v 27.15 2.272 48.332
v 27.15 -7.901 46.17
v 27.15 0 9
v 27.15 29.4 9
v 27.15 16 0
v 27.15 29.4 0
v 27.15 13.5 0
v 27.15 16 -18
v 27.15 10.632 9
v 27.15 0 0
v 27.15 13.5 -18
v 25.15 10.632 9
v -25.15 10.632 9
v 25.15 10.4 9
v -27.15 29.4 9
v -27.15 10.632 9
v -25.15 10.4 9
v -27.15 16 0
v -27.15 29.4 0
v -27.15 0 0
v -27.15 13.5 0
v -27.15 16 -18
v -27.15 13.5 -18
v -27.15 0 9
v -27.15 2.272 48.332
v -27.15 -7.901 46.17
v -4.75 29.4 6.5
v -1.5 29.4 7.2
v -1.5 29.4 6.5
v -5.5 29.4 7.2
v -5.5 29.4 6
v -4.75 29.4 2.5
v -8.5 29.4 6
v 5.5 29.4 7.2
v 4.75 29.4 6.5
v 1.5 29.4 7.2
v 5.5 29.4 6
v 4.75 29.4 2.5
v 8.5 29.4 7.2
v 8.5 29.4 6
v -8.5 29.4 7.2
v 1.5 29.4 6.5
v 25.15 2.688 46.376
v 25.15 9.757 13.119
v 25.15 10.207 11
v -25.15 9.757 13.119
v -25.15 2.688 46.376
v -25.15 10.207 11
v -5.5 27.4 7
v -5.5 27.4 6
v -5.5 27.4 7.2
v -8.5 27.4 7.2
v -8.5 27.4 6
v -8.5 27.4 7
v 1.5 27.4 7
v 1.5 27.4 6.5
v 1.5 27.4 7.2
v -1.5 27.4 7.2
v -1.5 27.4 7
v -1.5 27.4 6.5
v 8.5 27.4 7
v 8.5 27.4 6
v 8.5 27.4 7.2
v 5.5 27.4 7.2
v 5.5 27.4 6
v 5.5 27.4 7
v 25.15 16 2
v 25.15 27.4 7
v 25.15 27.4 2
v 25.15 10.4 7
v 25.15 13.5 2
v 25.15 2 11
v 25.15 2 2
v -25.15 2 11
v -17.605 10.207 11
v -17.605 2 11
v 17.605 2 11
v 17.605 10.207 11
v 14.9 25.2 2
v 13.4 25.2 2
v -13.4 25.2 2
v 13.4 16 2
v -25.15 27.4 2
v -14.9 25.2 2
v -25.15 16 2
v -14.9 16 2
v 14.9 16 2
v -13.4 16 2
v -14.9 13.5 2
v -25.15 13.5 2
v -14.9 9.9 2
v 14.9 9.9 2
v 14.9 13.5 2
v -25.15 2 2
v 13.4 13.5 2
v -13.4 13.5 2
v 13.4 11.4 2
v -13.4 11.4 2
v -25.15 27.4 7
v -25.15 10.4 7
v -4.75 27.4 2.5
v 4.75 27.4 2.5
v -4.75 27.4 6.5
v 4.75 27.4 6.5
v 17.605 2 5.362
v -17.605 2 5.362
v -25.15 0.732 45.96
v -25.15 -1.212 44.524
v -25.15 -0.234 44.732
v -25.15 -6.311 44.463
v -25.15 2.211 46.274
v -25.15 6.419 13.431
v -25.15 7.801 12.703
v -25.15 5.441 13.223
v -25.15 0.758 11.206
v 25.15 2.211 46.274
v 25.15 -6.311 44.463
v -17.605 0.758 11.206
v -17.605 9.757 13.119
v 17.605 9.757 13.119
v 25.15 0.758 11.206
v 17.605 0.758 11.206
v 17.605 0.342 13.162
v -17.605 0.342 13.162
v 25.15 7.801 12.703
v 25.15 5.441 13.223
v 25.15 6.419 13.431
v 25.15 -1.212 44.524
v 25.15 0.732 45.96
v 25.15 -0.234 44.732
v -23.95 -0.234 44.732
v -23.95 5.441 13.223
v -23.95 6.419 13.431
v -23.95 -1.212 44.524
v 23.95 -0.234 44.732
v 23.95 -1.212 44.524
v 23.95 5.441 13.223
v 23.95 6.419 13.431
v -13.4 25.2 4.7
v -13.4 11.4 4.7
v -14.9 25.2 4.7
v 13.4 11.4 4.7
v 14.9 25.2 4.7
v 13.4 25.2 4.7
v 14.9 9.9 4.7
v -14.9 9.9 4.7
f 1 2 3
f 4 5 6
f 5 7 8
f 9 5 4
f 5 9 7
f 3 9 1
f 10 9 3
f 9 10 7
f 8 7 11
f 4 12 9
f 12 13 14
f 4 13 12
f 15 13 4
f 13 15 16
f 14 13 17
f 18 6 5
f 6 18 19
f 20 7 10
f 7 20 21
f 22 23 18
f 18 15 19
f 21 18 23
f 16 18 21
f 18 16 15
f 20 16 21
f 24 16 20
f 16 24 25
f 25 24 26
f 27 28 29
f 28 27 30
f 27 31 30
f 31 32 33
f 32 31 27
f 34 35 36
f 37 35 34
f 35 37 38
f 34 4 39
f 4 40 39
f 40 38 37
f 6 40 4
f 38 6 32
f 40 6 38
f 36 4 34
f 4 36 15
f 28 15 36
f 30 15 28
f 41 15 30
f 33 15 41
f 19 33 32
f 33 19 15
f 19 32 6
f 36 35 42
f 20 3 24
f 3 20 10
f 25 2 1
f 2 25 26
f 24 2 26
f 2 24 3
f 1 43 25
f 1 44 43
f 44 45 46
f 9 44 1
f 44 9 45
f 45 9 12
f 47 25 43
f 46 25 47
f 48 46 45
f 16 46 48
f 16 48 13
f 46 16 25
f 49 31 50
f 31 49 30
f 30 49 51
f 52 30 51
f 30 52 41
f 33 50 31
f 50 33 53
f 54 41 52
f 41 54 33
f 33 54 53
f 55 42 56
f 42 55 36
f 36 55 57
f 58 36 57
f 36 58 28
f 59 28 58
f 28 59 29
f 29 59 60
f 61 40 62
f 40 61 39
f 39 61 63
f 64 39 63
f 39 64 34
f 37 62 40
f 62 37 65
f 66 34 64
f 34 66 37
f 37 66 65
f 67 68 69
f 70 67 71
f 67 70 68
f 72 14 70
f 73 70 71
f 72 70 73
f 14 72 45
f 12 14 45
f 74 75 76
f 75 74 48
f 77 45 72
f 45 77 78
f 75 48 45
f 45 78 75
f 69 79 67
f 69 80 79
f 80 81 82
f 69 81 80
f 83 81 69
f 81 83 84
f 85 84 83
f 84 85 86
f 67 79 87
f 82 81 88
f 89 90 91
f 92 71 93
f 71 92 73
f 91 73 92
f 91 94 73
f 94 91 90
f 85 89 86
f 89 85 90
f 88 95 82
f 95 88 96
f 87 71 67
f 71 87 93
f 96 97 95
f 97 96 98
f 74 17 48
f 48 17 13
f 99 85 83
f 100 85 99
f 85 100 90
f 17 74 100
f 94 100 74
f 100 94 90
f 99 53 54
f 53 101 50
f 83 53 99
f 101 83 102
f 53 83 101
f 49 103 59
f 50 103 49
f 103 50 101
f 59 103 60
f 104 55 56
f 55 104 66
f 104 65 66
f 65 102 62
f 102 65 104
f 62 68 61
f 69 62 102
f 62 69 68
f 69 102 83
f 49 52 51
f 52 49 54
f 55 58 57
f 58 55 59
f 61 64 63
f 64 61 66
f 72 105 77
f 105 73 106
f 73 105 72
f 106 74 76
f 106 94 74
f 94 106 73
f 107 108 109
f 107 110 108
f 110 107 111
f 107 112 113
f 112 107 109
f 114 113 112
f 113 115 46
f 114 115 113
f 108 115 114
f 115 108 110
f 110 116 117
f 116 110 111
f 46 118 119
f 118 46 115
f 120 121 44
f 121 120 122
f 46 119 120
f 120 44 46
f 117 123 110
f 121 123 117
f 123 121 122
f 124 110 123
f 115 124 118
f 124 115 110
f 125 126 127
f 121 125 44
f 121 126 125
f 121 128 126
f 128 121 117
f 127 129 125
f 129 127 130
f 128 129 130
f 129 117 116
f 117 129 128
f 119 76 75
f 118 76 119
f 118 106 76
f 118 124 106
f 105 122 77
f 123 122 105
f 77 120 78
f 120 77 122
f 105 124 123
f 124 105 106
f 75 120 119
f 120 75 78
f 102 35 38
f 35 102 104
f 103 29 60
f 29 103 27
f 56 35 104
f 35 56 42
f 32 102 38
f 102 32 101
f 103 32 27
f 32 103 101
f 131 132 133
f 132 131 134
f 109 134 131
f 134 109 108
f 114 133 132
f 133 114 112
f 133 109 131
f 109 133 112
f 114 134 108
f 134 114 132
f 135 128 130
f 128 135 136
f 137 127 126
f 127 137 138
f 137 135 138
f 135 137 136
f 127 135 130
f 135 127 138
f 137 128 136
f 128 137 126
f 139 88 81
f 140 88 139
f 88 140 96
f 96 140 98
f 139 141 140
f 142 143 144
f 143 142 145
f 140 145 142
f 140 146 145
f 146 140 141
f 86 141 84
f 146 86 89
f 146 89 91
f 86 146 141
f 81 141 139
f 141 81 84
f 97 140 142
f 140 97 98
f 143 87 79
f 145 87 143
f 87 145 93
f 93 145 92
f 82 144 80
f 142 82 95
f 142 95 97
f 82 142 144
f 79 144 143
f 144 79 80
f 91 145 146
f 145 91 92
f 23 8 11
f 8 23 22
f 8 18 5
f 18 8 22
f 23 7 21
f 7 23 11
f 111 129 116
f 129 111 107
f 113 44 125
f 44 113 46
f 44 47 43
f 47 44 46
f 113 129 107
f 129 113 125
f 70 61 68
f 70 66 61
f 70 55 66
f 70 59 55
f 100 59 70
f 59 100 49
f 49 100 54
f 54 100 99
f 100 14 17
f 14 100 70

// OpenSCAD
// ld2460_case.scad — HLK-LD2460 monitor-top enclosure (parametric, mm)
// Render: openscad -D part="shell" | "lid" | "all" -o out.stl ld2460_case.scad
// Frame: X=width (centred), Y=depth (front at 0, screen at +Y), Z=up (foot base at 0)

part = "all";          // "shell" | "lid" | "all"
$fn = 48;

/* ----- Measured / to-confirm (defaults are placeholders) ----- */
ld2460_w     = 32;     // PCB short edge
ld2460_h     = 49.5;   // PCB long edge
landscape    = true;   // true: long edge horizontal (X); false: portrait (long edge up, Z)
ld2460_t     = 1.2;    // PCB thickness            [MEASURE]
comp_height  = 5.0;    // front parts incl. perpendicular connectors [CONFIRM]
ch343_l      = 26;     // CH343P long edge (across X)
ch343_w      = 13;     // CH343P short edge (along Y)
ch343_t      = 1.2;    // CH343P thickness         [MEASURE]
usb_w        = 9.5;    // Type-C cutout width      [MEASURE]
usb_h        = 4.0;    // Type-C cutout height     [MEASURE]
screen_edge_t = 12;    // monitor top-edge thickness [MEASURE]

/* ----- Design / fit ----- */
wall         = 2.0;
window_wall  = 1.2;    // thin RF face
window_clear = 1.0;    // gap beyond comp_height to inner window
back_gap     = 2.0;    // behind PCB (solder side)
fit_clear    = 0.4;    // board/lid slip fit
tilt_deg     = 12;     // antenna look-down tilt
connector_clear = 12;  // perpendicular room for the plugged harness
foot_extra_depth = 4;  // foot margin behind CH343P
hook_lip_h   = 18;     // lip drop behind screen
hook_wall    = 2.5;
hook_clear   = 1.5;    // slip over the screen edge
snap_w       = 8;
snap_t       = 1.6;
snap_hook    = 1.0;
lid_t        = 2.0;
vent         = true;

/* ----- Derived ----- */
board_x   = landscape ? ld2460_h : ld2460_w;   // board extent across the case (X)
board_z   = landscape ? ld2460_w : ld2460_h;   // board extent up the upright (Z)
cav_w     = board_x + 2 * fit_clear;           // inner width
out_w     = cav_w + 2 * wall;                  // outer width
front_gap = comp_height + window_clear;        // board front -> window inner
up_in_d   = front_gap + ld2460_t + back_gap;   // upright inner depth (Y)
up_out_d  = window_wall + up_in_d;             // upright outer depth (back open)
board_margin = 3;
up_h      = board_z + 2 * board_margin;       // upright inner height (board + slack)
foot_h    = wall + max(ch343_t + usb_h, 6) + 1;
foot_depth = up_out_d + ch343_w + foot_extra_depth + wall;
// The tilted upright must sink into the foot so the two weld into one solid
// (a flat-on-tilted contact would only touch along an edge -> non-manifold).
plunge    = up_out_d * sin(tilt_deg) + 2;

/* ----- Guards ----- */
assert(window_wall >= 0.8, "window_wall too thin to print (>= 0.8 mm)");
assert(wall >= 1.2, "wall too thin (>= 1.2 mm)");
assert(front_gap > comp_height, "window gap must exceed comp_height");
assert(cav_w > 2 * wall, "cavity width collapses; check board size/wall");

// A few slots in the foot rear wall for the (small) thermal load.
module vent_slots() {
    if (vent)
        for (i = [-1, 0, 1])
            translate([i * 7 - 1.5, foot_depth - wall - 1, foot_h - 3])
                cube([3, wall + 2, 1.2]);
}

// Hollow interior of the upright (board + clearances); thin window stays at the
// front, side walls remain, back stays open for the lid.
module ld2460_board_cavity() {
    translate([wall, window_wall, wall])
        cube([out_w - 2 * wall, up_in_d + 1, up_h - 2 * wall]);
}

// Per-side rib pairs that form a vertical groove gripping the left/right PCB
// edges. Each rib overlaps its side wall (for a clean manifold weld) and
// protrudes into the cavity; the front/back rib pair captures the board edge in
// Y at the board's front-face position (so the antenna sees the window).
module ld2460_edge_slots() {
    slot_y = window_wall + front_gap;          // board front face (Y)
    protrude = 1.2;                            // how far ribs reach into cavity
    rib_t = 1.0;                               // rib thickness in Y
    z0 = wall + 1;
    zh = up_h - 2 * wall - 2;
    // left side: overlap the left wall, protrude into the cavity (+X)
    for (ry = [slot_y - rib_t, slot_y + ld2460_t + fit_clear])
        translate([wall - 1.2, ry, z0]) cube([protrude + 1.2, rib_t, zh]);
    // right side: overlap the right wall, protrude into the cavity (-X)
    for (ry = [slot_y - rib_t, slot_y + ld2460_t + fit_clear])
        translate([out_w - wall - protrude, ry, z0]) cube([protrude + 1.2, rib_t, zh]);
}

module foot_interior() {
    translate([wall, wall, wall])
        cube([out_w - 2 * wall, foot_depth - 2 * wall, foot_h]);  // open top
}

// Cut (in the upright local frame): opens the cavity floor down through the
// plunge into the foot interior so the perpendicular harness plugs and the 4
// wires route from the board's connector edge down to the CH343P.
module wire_channel() {
    cw = cav_w * 0.7;
    translate([(out_w - cw) / 2, window_wall, -plunge - 2])
        cube([cw, up_in_d, wall + plunge + 4]);
}

// Additive U of retaining ribs in the foot floor that locate the CH343P (flat,
// long edge across X, short edge along Y, Type-C toward the back/+Y, open at the
// back for the lid's USB cutout).
module ch343_pocket() {
    pw = ch343_l + 2 * fit_clear;
    pd = ch343_w + 2 * fit_clear;
    py = up_out_d + 1;             // pocket front, just behind the upright base
    rib = 1.5;
    rh = ch343_t + 2;
    translate([-pw / 2 - rib, py, wall - 0.5]) cube([rib, pd, rh]);            // left
    translate([pw / 2, py, wall - 0.5]) cube([rib, pd, rh]);                   // right
    translate([-pw / 2 - rib, py - rib, wall - 0.5]) cube([pw + 2 * rib, rib, rh]);  // front
}

// A lip hanging below the foot, just behind the screen's back face, so the unit
// cannot slide forward off the screen. The foot rests on the screen top from the
// front (y=0) to its back face (~screen_edge_t); the lip drops behind that.
module rear_hook() {
    ly = screen_edge_t + hook_clear;
    translate([-out_w / 2, ly, -hook_lip_h])
        cube([out_w, hook_wall, hook_lip_h + wall]);  // welds to the foot floor
}

// Type-C cutout in the foot's rear wall (the CH343P's connector faces +Y).
module usb_cutout() {
    translate([-usb_w / 2, foot_depth - wall - 1, wall + 0.5])
        cube([usb_w, wall + 2, usb_h]);
}

module shell() {
    difference() {
        union() {
            translate([-out_w / 2, 0, 0]) cube([out_w, foot_depth, foot_h]);
            translate([0, 0, foot_h])
                rotate([tilt_deg, 0, 0])
                    translate([-out_w / 2, 0, -plunge])
                        cube([out_w, up_out_d, up_h + plunge]);
        }
        translate([-out_w / 2, 0, 0]) foot_interior();
        translate([0, 0, foot_h])
            rotate([tilt_deg, 0, 0])
                translate([-out_w / 2, 0, 0]) ld2460_board_cavity();
        translate([0, 0, foot_h])
            rotate([tilt_deg, 0, 0])
                translate([-out_w / 2, 0, 0]) wire_channel();
        usb_cutout();
        vent_slots();
    }
    translate([0, 0, foot_h])
        rotate([tilt_deg, 0, 0])
            translate([-out_w / 2, 0, 0]) ld2460_edge_slots();
    ch343_pocket();
    rear_hook();
}
// L-shaped cover: a tilted panel closing the upright's open back, plus a
// horizontal panel closing the foot's open top behind the upright. The Type-C
// cutout lives in the shell's foot rear wall, not here.
module lid() {
    // Upright back panel (tilted frame), sized to the open cavity width/height.
    translate([0, 0, foot_h])
        rotate([tilt_deg, 0, 0])
            translate([-out_w / 2, 0, 0])
                translate([wall, up_out_d - lid_t, wall])
                    cube([out_w - 2 * wall, lid_t, up_h - 2 * wall]);
    // Foot top panel, from behind the upright base to the foot rear wall.
    translate([-out_w / 2 + wall, up_out_d, foot_h - lid_t])
        cube([out_w - 2 * wall, foot_depth - up_out_d - wall, lid_t]);
}

if (part == "shell") shell();
else if (part == "lid") lid();
else { shell(); lid(); }
